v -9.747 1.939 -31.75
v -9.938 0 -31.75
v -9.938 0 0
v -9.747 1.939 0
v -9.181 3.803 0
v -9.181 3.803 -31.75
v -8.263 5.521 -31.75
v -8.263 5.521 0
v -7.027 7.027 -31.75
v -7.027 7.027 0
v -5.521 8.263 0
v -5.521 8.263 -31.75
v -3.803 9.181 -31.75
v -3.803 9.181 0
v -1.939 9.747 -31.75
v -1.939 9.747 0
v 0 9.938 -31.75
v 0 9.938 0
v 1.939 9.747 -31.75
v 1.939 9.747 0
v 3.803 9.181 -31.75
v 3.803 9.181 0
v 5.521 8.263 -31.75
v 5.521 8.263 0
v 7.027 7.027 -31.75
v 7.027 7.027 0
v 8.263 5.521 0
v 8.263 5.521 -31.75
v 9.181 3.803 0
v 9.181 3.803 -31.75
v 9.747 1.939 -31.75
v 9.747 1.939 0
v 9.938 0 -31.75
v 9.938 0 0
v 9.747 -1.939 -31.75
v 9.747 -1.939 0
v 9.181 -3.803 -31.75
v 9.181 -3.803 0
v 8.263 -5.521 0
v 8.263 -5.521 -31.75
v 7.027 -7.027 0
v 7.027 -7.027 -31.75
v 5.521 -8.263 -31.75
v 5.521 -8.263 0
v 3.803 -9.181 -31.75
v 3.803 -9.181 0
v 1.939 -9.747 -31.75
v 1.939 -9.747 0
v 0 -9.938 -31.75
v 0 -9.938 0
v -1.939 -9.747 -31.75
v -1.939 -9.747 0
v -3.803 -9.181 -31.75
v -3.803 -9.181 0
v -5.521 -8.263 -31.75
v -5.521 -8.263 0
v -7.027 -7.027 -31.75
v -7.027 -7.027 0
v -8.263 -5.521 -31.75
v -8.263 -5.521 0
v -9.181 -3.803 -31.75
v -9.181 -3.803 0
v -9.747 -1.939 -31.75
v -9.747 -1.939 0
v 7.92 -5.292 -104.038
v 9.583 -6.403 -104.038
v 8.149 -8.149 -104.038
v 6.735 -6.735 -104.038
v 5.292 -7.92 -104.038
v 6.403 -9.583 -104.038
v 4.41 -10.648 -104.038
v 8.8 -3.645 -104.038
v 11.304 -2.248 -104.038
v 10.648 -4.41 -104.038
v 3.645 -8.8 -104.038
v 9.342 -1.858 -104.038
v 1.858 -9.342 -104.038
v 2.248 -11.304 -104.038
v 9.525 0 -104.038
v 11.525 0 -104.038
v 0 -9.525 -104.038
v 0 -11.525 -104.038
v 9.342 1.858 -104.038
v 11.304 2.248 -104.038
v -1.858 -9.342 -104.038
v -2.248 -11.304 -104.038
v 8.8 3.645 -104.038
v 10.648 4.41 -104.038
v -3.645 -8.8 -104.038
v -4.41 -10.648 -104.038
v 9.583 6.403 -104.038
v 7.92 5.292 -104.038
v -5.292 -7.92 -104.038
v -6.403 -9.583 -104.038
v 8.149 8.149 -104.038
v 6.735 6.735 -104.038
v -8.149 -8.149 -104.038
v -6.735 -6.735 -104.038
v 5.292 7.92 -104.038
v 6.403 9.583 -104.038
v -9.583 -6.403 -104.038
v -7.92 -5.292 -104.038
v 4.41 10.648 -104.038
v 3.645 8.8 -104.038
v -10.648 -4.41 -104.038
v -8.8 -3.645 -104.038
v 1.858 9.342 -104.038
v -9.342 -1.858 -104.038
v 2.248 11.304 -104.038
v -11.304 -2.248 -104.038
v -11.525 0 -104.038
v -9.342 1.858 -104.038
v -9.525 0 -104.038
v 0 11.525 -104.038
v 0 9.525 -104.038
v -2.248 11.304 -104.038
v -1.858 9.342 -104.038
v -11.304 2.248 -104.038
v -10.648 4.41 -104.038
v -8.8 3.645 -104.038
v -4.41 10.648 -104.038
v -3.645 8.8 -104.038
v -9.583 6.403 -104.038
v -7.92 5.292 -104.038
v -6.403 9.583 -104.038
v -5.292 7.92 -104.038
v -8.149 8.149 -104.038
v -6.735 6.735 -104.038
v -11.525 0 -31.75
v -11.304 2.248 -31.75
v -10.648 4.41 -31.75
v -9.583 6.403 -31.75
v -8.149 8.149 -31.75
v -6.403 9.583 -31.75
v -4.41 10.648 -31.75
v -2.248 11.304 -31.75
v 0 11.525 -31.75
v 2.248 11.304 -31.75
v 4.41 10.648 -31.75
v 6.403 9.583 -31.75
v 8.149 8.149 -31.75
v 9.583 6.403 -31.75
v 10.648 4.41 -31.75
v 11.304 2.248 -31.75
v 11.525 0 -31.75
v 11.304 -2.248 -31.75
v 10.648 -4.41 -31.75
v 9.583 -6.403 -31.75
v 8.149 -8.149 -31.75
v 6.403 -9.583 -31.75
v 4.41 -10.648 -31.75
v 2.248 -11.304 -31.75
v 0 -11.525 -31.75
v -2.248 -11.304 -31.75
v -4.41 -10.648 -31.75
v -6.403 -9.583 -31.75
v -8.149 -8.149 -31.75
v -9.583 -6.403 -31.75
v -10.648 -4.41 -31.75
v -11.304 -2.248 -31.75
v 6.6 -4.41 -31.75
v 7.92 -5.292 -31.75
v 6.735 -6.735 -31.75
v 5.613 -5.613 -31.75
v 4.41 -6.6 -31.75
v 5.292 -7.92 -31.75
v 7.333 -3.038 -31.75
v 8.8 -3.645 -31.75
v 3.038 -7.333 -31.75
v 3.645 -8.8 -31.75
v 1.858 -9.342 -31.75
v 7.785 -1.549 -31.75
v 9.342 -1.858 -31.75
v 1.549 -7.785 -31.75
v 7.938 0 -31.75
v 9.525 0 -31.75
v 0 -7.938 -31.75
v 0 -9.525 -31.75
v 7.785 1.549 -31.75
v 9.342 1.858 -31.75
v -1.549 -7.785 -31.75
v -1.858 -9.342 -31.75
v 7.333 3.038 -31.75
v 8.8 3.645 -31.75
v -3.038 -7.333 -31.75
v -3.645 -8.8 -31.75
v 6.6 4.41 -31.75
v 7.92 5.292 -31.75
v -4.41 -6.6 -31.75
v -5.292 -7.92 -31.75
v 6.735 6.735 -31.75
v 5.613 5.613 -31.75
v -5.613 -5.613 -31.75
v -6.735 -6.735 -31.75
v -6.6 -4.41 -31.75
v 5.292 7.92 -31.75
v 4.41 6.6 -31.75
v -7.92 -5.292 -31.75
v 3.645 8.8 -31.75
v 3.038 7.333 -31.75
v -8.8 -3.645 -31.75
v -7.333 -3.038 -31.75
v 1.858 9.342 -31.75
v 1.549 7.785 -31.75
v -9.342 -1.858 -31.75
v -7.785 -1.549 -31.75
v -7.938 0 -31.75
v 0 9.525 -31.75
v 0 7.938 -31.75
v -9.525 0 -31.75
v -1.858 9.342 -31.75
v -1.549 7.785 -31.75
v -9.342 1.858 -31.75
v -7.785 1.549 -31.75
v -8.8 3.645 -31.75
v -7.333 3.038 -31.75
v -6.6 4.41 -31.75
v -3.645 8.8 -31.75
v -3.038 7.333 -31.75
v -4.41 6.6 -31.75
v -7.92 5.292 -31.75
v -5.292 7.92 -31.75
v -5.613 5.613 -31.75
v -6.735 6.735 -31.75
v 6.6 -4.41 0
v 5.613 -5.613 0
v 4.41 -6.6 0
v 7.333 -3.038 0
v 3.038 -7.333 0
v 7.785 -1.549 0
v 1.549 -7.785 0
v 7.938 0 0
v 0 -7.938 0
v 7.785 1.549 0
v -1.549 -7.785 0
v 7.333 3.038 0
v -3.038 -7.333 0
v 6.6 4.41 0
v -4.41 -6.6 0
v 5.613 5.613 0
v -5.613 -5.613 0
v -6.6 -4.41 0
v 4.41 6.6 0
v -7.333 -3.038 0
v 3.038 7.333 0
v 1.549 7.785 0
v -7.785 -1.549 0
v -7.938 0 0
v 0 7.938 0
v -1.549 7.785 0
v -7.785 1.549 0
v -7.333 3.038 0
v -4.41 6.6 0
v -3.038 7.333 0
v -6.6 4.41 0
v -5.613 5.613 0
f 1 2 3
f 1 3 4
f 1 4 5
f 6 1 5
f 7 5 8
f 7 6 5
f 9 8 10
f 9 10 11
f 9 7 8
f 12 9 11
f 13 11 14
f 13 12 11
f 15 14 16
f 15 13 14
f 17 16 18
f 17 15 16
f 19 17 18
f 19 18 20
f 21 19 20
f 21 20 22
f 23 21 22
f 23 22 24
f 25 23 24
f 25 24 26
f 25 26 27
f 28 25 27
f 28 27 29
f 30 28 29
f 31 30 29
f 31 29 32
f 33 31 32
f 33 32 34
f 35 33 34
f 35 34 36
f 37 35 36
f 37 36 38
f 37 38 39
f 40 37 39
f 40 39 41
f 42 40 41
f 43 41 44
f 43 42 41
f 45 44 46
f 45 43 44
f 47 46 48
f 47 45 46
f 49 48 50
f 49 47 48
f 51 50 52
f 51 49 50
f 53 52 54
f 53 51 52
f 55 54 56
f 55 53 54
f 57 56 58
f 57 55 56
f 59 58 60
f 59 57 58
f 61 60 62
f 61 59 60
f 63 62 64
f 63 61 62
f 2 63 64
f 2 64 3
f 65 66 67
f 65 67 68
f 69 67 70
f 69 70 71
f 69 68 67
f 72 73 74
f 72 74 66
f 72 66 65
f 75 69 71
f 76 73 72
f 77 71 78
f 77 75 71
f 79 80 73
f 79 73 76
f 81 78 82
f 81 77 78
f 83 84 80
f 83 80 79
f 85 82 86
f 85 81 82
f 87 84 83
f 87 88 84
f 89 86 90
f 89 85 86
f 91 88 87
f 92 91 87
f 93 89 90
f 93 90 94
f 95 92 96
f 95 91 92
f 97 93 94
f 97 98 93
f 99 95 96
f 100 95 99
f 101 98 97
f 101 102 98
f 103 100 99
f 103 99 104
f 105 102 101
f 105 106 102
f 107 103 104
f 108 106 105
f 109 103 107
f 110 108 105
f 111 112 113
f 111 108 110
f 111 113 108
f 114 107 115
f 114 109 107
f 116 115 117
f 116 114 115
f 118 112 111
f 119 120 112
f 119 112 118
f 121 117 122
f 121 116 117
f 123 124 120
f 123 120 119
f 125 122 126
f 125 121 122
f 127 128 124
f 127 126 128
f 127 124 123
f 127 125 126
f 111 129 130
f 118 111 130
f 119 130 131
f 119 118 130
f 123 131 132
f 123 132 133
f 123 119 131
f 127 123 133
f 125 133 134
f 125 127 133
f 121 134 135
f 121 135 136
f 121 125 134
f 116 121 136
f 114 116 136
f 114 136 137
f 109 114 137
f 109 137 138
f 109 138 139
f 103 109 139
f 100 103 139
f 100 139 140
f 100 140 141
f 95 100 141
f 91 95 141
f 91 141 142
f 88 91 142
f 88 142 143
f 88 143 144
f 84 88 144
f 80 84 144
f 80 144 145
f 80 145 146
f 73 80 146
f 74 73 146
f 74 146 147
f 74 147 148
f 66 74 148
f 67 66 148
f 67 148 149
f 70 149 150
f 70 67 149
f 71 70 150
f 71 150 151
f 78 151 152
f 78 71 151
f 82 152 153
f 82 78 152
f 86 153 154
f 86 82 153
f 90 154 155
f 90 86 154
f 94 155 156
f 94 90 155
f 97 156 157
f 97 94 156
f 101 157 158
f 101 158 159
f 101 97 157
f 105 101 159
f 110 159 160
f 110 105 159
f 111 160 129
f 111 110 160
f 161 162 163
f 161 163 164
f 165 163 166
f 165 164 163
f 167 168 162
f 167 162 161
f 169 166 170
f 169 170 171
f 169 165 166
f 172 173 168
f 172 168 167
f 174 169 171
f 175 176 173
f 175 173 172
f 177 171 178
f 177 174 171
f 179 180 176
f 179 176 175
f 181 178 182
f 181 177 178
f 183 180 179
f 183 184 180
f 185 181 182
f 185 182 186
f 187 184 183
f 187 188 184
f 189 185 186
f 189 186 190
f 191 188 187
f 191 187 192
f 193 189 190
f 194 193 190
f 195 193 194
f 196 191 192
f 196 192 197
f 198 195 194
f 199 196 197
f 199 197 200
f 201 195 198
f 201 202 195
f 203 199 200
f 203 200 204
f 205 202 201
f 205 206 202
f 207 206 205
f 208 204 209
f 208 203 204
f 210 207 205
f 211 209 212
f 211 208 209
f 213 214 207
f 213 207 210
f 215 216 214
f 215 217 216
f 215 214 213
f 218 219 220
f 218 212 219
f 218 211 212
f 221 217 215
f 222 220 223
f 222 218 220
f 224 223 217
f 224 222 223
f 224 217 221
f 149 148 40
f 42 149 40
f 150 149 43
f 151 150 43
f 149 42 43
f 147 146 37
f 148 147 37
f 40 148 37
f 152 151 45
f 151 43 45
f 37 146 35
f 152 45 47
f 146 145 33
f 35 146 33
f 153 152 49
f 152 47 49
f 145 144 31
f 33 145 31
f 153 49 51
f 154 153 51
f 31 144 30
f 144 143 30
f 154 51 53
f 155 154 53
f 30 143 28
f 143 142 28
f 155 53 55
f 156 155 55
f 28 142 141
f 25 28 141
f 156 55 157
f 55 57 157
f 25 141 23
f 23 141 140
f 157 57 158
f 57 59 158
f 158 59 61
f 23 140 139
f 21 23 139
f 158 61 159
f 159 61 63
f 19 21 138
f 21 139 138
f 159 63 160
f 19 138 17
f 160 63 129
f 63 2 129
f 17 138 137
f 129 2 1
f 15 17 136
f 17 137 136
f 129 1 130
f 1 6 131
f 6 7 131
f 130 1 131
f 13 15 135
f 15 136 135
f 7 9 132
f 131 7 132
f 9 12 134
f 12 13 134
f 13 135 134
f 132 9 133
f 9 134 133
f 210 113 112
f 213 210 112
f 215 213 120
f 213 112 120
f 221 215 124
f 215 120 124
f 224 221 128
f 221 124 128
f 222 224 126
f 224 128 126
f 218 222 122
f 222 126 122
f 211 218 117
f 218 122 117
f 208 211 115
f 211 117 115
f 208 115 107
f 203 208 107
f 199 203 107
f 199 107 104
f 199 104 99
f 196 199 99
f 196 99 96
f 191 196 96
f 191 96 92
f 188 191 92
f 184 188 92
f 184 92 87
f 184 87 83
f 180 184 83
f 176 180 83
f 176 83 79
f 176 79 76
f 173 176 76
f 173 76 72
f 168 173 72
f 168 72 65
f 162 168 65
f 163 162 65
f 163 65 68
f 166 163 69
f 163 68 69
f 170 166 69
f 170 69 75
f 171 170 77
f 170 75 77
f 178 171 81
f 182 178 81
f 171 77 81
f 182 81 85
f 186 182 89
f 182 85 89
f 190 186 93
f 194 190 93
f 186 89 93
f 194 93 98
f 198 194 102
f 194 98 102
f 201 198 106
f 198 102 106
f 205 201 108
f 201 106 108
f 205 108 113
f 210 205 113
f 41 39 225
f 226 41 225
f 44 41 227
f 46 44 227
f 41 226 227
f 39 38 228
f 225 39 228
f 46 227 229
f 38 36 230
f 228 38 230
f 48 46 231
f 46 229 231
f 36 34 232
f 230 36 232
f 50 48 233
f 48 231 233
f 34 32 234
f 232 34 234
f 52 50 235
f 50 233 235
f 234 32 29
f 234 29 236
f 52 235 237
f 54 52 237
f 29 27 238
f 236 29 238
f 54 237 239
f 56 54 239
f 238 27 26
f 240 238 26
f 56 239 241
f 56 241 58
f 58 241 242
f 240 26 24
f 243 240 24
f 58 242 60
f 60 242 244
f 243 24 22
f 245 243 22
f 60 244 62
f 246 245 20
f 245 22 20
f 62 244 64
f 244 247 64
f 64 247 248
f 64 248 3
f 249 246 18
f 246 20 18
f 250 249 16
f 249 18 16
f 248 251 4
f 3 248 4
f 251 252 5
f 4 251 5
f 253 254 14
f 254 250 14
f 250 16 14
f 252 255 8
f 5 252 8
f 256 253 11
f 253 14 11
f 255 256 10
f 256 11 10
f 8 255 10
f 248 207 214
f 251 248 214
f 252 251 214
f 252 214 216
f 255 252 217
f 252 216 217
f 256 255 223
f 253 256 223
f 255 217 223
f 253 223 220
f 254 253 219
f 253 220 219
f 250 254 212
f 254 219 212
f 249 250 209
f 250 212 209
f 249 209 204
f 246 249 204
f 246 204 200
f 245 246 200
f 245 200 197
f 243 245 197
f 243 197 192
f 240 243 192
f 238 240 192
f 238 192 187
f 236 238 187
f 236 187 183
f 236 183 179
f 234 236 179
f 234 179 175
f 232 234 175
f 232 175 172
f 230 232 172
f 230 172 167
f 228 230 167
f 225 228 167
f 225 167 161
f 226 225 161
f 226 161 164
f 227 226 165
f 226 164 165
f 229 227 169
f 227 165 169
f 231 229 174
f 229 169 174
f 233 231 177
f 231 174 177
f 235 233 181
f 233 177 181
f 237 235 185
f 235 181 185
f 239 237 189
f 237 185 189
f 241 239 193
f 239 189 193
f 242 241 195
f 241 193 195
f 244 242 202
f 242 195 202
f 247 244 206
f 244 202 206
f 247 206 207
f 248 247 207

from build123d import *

# Parameters (mm, degrees)
SWEEP1_PROFILE_R     = 9.9375
CUT_SWEEP1_PROFILE_R = 7.9375
SWEEP2_PROFILE_R     = 11.525
CUT_SWEEP2_PROFILE_R = 9.525


with BuildPart() as part:
    # Sweep1: sweep along a path in Sketch9
    with BuildLine(Plane(origin=(0, 0, 0), x_dir=(1, 0, 0), z_dir=(0, 1, 0))) as sweep1_path:
        Line((0, 0), (0, 31.75))
    # Sweep1 profile (on start of the path) → Sweep1 (sweep)
    with BuildSketch(Plane(origin=(0, 0, 0), x_dir=(-1, 0, 0), z_dir=(0, 0, -1))):
        Circle(SWEEP1_PROFILE_R)
    sweep(path=sweep1_path.line)

    # Cut-Sweep1: sweep along a path in Sketch9<2>
    with BuildLine(Plane(origin=(0, 0, 0), x_dir=(1, 0, 0), z_dir=(0, 1, 0))) as cut_sweep1_path:
        Line((0, 0), (0, 31.75))
    # Cut-Sweep1 profile (on start of the path) → Cut-Sweep1 (sweep, cut)
    with BuildSketch(Plane(origin=(0, 0, 0), x_dir=(-1, 0, 0), z_dir=(0, 0, -1))):
        Circle(CUT_SWEEP1_PROFILE_R)
    sweep(path=cut_sweep1_path.line, mode=Mode.SUBTRACT)

    # Sweep2: sweep along a path in Sketch31
    with BuildLine(Plane(origin=(0, 0, 0), x_dir=(1, 0, 0), z_dir=(0, 1, 0))) as sweep2_path:
        Line((0, 31.75), (0, 104.0384))
    # Sweep2 profile (on start of the path) → Sweep2 (sweep)
    with BuildSketch(Plane(origin=(0, 0, -31.75), x_dir=(-1, 0, 0), z_dir=(0, 0, -1))):
        Circle(SWEEP2_PROFILE_R)
    sweep(path=sweep2_path.line)

    # Cut-Sweep2: sweep along a path in Sketch31<2>
    with BuildLine(Plane(origin=(0, 0, 0), x_dir=(1, 0, 0), z_dir=(0, 1, 0))) as cut_sweep2_path:
        Line((0, 31.75), (0, 104.0384))
    # Cut-Sweep2 profile (on start of the path) → Cut-Sweep2 (sweep, cut)
    with BuildSketch(Plane(origin=(0, 0, -31.75), x_dir=(-1, 0, 0), z_dir=(0, 0, -1))):
        Circle(CUT_SWEEP2_PROFILE_R)
    sweep(path=cut_sweep2_path.line, mode=Mode.SUBTRACT)


solid = part.part
